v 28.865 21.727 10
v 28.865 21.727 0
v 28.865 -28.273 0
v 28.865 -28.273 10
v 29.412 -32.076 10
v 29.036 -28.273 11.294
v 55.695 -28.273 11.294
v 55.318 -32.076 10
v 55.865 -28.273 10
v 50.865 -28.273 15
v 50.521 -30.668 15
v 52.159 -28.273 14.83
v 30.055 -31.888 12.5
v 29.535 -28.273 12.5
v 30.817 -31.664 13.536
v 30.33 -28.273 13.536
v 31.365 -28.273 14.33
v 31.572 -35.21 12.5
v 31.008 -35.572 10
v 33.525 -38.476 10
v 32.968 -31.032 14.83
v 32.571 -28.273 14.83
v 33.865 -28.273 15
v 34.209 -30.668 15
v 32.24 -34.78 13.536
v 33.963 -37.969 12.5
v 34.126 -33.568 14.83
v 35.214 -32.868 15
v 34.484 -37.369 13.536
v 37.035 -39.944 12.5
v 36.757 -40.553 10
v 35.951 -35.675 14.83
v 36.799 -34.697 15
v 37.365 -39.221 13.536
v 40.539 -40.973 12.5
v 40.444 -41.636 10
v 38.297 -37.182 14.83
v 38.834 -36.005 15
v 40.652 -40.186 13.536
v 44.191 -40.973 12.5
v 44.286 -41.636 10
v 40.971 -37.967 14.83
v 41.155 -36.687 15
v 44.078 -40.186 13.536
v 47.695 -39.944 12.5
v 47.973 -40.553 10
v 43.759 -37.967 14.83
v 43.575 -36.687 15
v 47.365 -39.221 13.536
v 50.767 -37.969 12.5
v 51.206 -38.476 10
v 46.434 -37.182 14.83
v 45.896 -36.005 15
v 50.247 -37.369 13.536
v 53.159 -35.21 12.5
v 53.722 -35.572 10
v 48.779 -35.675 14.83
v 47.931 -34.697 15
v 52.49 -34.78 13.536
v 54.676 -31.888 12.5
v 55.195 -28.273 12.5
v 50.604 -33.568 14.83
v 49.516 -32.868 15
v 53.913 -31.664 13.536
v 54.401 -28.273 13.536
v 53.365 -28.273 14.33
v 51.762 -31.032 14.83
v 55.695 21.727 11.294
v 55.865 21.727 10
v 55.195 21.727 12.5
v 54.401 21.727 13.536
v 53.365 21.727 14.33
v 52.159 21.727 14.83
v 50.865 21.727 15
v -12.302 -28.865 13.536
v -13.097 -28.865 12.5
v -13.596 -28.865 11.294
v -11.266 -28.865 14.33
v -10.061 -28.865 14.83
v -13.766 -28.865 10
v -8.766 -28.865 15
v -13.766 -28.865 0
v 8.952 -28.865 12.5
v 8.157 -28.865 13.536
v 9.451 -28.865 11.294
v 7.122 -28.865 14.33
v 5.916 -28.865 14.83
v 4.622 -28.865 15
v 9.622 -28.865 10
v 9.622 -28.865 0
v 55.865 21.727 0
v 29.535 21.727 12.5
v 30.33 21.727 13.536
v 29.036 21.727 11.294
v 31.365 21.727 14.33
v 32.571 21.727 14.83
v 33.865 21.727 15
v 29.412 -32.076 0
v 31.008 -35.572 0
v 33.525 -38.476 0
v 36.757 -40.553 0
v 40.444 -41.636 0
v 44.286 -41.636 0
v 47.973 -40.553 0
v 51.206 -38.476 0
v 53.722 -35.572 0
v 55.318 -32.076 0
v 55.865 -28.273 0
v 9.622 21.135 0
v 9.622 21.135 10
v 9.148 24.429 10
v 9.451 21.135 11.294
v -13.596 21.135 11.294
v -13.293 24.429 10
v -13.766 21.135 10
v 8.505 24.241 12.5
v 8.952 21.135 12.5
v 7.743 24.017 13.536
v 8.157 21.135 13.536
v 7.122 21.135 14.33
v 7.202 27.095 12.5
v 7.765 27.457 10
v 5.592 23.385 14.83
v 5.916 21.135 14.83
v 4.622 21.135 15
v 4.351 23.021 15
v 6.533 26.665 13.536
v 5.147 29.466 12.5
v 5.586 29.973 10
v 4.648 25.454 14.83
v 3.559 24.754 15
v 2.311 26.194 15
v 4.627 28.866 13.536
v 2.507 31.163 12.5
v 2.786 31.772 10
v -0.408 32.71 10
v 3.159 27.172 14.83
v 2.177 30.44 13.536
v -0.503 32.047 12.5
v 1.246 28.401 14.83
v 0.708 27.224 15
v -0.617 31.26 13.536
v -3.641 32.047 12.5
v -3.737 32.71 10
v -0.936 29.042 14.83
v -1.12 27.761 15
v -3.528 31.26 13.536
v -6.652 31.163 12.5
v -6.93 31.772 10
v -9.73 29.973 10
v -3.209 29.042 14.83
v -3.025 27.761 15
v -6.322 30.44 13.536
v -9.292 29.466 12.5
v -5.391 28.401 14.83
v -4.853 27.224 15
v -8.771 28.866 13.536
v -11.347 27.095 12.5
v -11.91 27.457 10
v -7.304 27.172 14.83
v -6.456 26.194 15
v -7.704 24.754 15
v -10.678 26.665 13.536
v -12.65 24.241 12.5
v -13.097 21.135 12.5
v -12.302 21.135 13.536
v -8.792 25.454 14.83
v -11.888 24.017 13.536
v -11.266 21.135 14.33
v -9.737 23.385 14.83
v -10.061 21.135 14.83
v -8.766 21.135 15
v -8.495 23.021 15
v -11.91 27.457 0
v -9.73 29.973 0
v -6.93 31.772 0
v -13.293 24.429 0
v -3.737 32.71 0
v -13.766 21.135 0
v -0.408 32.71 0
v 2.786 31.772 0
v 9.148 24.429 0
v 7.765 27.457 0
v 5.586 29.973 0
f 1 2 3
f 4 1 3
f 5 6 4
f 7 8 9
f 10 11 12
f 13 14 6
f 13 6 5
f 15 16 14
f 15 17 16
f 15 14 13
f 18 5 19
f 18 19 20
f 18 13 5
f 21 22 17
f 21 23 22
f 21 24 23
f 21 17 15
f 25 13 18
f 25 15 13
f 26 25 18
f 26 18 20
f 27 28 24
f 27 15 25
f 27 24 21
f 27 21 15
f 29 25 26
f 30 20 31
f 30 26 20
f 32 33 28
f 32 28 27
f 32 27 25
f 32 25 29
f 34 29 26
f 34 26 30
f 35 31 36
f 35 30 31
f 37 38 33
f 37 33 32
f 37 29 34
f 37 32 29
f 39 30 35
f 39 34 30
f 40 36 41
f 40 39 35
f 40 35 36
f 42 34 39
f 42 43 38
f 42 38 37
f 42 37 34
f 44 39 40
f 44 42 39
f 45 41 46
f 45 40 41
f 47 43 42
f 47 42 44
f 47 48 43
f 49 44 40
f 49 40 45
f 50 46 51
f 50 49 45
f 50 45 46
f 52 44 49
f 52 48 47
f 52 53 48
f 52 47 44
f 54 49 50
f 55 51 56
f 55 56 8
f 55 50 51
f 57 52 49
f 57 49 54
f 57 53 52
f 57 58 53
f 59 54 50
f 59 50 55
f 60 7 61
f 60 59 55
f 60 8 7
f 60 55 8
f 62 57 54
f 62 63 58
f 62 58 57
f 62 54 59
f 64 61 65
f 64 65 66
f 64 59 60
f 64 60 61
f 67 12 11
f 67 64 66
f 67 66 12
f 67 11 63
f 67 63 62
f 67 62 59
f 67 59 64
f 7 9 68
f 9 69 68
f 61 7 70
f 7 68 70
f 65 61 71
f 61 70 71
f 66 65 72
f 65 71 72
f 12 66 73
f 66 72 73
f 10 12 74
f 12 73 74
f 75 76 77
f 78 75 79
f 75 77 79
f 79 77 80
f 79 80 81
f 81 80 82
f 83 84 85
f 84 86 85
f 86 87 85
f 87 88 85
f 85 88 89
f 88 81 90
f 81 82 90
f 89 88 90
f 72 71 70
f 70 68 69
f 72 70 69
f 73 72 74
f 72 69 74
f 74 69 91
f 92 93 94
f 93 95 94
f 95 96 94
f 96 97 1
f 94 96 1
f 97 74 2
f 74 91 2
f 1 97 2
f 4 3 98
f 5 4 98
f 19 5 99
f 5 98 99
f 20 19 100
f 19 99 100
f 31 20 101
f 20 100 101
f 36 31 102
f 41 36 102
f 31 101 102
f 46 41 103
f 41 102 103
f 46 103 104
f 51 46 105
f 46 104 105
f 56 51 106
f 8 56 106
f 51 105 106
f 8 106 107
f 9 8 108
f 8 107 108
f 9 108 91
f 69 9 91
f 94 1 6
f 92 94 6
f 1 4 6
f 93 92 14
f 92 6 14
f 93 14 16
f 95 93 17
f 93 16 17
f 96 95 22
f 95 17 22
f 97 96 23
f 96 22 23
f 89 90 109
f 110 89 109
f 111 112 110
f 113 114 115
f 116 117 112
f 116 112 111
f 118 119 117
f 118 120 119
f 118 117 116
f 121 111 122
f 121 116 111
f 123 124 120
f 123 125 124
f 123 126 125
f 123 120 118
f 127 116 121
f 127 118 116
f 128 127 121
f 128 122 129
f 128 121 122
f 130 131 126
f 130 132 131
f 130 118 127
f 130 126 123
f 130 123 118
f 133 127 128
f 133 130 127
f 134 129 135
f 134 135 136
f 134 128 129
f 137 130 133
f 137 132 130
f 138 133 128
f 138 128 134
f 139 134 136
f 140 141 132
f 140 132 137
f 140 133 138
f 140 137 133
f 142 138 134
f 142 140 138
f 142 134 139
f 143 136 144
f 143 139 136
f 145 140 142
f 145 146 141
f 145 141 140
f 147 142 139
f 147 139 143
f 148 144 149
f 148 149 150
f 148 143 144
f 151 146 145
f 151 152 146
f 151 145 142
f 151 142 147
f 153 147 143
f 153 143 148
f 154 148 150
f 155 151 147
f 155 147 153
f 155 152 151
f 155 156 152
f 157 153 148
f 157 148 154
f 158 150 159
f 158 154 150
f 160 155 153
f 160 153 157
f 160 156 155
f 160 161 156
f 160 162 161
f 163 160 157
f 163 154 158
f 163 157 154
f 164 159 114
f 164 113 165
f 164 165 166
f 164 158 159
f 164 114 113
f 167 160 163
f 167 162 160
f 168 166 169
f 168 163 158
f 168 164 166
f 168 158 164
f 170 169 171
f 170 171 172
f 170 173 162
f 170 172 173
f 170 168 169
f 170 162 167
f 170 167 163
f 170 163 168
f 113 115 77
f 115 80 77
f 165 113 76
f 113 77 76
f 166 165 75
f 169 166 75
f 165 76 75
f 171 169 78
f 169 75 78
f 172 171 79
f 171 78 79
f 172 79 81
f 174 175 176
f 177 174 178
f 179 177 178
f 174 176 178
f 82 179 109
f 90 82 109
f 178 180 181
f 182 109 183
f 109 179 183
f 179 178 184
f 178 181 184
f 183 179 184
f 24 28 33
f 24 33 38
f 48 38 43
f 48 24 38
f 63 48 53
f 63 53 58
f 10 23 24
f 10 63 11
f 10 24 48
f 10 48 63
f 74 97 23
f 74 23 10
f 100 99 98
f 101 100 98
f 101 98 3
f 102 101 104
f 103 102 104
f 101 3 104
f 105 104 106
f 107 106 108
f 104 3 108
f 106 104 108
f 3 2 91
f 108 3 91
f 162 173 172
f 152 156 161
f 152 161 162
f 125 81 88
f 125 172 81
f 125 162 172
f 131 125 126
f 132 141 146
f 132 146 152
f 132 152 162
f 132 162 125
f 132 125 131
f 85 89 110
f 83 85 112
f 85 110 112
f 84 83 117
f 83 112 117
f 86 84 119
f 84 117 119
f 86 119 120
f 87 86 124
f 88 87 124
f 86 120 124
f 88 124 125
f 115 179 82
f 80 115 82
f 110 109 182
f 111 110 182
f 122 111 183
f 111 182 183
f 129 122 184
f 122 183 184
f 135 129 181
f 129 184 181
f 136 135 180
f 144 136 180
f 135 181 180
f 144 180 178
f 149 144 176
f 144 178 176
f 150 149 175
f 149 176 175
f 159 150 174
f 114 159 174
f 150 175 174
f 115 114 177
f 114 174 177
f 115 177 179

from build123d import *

# Parameters (mm, degrees)
F1_DEPTH = 15
F3_DEPTH = 15
F4_R     = 5
F4_2_R   = 5


with BuildPart() as f1:
    # F0 (on Top) → F1 (new body)
    with BuildSketch(Plane.XY):
        with BuildLine():
            ThreePointArc((9.621711, 21.134868), (-2.072368, 32.828947), (-13.766447, 21.134868))
            Line((-13.766447, 21.134868), (-13.766447, -28.865132))
            Line((-13.766447, -28.865132), (9.621711, -28.865132))
            Line((9.621711, -28.865132), (9.621711, 21.134868))
        make_face()
    extrude(amount=F1_DEPTH)

    # F4
    f4_edges = [f1.edges().sort_by_distance(p)[0] for p in [
        (-13.766447, -3.865132, 15),
    ]]
    fillet(f4_edges, radius=F4_R)


with BuildPart() as f3:
    # F2 (on Top) → F3 (new body)
    with BuildSketch(Plane.XY):
        with BuildLine():
            Line((48.865134, 21.726973), (28.865134, 21.726973))
            Line((28.865134, 21.726973), (28.865134, -28.273027))
            ThreePointArc((28.865134, -28.273027), (42.365134, -41.773027), (55.865134, -28.273027))
            Line((55.865134, -28.273027), (55.865134, 21.726973))
            Line((55.865134, 21.726973), (48.865134, 21.726973))
        make_face()
    extrude(amount=F3_DEPTH)

    # F4#2
    f4_2_edges = [f3.edges().sort_by_distance(p)[0] for p in [
        (28.865134, -3.273027, 15),
    ]]
    fillet(f4_2_edges, radius=F4_2_R)


solid = Compound([f1.part, f3.part])
